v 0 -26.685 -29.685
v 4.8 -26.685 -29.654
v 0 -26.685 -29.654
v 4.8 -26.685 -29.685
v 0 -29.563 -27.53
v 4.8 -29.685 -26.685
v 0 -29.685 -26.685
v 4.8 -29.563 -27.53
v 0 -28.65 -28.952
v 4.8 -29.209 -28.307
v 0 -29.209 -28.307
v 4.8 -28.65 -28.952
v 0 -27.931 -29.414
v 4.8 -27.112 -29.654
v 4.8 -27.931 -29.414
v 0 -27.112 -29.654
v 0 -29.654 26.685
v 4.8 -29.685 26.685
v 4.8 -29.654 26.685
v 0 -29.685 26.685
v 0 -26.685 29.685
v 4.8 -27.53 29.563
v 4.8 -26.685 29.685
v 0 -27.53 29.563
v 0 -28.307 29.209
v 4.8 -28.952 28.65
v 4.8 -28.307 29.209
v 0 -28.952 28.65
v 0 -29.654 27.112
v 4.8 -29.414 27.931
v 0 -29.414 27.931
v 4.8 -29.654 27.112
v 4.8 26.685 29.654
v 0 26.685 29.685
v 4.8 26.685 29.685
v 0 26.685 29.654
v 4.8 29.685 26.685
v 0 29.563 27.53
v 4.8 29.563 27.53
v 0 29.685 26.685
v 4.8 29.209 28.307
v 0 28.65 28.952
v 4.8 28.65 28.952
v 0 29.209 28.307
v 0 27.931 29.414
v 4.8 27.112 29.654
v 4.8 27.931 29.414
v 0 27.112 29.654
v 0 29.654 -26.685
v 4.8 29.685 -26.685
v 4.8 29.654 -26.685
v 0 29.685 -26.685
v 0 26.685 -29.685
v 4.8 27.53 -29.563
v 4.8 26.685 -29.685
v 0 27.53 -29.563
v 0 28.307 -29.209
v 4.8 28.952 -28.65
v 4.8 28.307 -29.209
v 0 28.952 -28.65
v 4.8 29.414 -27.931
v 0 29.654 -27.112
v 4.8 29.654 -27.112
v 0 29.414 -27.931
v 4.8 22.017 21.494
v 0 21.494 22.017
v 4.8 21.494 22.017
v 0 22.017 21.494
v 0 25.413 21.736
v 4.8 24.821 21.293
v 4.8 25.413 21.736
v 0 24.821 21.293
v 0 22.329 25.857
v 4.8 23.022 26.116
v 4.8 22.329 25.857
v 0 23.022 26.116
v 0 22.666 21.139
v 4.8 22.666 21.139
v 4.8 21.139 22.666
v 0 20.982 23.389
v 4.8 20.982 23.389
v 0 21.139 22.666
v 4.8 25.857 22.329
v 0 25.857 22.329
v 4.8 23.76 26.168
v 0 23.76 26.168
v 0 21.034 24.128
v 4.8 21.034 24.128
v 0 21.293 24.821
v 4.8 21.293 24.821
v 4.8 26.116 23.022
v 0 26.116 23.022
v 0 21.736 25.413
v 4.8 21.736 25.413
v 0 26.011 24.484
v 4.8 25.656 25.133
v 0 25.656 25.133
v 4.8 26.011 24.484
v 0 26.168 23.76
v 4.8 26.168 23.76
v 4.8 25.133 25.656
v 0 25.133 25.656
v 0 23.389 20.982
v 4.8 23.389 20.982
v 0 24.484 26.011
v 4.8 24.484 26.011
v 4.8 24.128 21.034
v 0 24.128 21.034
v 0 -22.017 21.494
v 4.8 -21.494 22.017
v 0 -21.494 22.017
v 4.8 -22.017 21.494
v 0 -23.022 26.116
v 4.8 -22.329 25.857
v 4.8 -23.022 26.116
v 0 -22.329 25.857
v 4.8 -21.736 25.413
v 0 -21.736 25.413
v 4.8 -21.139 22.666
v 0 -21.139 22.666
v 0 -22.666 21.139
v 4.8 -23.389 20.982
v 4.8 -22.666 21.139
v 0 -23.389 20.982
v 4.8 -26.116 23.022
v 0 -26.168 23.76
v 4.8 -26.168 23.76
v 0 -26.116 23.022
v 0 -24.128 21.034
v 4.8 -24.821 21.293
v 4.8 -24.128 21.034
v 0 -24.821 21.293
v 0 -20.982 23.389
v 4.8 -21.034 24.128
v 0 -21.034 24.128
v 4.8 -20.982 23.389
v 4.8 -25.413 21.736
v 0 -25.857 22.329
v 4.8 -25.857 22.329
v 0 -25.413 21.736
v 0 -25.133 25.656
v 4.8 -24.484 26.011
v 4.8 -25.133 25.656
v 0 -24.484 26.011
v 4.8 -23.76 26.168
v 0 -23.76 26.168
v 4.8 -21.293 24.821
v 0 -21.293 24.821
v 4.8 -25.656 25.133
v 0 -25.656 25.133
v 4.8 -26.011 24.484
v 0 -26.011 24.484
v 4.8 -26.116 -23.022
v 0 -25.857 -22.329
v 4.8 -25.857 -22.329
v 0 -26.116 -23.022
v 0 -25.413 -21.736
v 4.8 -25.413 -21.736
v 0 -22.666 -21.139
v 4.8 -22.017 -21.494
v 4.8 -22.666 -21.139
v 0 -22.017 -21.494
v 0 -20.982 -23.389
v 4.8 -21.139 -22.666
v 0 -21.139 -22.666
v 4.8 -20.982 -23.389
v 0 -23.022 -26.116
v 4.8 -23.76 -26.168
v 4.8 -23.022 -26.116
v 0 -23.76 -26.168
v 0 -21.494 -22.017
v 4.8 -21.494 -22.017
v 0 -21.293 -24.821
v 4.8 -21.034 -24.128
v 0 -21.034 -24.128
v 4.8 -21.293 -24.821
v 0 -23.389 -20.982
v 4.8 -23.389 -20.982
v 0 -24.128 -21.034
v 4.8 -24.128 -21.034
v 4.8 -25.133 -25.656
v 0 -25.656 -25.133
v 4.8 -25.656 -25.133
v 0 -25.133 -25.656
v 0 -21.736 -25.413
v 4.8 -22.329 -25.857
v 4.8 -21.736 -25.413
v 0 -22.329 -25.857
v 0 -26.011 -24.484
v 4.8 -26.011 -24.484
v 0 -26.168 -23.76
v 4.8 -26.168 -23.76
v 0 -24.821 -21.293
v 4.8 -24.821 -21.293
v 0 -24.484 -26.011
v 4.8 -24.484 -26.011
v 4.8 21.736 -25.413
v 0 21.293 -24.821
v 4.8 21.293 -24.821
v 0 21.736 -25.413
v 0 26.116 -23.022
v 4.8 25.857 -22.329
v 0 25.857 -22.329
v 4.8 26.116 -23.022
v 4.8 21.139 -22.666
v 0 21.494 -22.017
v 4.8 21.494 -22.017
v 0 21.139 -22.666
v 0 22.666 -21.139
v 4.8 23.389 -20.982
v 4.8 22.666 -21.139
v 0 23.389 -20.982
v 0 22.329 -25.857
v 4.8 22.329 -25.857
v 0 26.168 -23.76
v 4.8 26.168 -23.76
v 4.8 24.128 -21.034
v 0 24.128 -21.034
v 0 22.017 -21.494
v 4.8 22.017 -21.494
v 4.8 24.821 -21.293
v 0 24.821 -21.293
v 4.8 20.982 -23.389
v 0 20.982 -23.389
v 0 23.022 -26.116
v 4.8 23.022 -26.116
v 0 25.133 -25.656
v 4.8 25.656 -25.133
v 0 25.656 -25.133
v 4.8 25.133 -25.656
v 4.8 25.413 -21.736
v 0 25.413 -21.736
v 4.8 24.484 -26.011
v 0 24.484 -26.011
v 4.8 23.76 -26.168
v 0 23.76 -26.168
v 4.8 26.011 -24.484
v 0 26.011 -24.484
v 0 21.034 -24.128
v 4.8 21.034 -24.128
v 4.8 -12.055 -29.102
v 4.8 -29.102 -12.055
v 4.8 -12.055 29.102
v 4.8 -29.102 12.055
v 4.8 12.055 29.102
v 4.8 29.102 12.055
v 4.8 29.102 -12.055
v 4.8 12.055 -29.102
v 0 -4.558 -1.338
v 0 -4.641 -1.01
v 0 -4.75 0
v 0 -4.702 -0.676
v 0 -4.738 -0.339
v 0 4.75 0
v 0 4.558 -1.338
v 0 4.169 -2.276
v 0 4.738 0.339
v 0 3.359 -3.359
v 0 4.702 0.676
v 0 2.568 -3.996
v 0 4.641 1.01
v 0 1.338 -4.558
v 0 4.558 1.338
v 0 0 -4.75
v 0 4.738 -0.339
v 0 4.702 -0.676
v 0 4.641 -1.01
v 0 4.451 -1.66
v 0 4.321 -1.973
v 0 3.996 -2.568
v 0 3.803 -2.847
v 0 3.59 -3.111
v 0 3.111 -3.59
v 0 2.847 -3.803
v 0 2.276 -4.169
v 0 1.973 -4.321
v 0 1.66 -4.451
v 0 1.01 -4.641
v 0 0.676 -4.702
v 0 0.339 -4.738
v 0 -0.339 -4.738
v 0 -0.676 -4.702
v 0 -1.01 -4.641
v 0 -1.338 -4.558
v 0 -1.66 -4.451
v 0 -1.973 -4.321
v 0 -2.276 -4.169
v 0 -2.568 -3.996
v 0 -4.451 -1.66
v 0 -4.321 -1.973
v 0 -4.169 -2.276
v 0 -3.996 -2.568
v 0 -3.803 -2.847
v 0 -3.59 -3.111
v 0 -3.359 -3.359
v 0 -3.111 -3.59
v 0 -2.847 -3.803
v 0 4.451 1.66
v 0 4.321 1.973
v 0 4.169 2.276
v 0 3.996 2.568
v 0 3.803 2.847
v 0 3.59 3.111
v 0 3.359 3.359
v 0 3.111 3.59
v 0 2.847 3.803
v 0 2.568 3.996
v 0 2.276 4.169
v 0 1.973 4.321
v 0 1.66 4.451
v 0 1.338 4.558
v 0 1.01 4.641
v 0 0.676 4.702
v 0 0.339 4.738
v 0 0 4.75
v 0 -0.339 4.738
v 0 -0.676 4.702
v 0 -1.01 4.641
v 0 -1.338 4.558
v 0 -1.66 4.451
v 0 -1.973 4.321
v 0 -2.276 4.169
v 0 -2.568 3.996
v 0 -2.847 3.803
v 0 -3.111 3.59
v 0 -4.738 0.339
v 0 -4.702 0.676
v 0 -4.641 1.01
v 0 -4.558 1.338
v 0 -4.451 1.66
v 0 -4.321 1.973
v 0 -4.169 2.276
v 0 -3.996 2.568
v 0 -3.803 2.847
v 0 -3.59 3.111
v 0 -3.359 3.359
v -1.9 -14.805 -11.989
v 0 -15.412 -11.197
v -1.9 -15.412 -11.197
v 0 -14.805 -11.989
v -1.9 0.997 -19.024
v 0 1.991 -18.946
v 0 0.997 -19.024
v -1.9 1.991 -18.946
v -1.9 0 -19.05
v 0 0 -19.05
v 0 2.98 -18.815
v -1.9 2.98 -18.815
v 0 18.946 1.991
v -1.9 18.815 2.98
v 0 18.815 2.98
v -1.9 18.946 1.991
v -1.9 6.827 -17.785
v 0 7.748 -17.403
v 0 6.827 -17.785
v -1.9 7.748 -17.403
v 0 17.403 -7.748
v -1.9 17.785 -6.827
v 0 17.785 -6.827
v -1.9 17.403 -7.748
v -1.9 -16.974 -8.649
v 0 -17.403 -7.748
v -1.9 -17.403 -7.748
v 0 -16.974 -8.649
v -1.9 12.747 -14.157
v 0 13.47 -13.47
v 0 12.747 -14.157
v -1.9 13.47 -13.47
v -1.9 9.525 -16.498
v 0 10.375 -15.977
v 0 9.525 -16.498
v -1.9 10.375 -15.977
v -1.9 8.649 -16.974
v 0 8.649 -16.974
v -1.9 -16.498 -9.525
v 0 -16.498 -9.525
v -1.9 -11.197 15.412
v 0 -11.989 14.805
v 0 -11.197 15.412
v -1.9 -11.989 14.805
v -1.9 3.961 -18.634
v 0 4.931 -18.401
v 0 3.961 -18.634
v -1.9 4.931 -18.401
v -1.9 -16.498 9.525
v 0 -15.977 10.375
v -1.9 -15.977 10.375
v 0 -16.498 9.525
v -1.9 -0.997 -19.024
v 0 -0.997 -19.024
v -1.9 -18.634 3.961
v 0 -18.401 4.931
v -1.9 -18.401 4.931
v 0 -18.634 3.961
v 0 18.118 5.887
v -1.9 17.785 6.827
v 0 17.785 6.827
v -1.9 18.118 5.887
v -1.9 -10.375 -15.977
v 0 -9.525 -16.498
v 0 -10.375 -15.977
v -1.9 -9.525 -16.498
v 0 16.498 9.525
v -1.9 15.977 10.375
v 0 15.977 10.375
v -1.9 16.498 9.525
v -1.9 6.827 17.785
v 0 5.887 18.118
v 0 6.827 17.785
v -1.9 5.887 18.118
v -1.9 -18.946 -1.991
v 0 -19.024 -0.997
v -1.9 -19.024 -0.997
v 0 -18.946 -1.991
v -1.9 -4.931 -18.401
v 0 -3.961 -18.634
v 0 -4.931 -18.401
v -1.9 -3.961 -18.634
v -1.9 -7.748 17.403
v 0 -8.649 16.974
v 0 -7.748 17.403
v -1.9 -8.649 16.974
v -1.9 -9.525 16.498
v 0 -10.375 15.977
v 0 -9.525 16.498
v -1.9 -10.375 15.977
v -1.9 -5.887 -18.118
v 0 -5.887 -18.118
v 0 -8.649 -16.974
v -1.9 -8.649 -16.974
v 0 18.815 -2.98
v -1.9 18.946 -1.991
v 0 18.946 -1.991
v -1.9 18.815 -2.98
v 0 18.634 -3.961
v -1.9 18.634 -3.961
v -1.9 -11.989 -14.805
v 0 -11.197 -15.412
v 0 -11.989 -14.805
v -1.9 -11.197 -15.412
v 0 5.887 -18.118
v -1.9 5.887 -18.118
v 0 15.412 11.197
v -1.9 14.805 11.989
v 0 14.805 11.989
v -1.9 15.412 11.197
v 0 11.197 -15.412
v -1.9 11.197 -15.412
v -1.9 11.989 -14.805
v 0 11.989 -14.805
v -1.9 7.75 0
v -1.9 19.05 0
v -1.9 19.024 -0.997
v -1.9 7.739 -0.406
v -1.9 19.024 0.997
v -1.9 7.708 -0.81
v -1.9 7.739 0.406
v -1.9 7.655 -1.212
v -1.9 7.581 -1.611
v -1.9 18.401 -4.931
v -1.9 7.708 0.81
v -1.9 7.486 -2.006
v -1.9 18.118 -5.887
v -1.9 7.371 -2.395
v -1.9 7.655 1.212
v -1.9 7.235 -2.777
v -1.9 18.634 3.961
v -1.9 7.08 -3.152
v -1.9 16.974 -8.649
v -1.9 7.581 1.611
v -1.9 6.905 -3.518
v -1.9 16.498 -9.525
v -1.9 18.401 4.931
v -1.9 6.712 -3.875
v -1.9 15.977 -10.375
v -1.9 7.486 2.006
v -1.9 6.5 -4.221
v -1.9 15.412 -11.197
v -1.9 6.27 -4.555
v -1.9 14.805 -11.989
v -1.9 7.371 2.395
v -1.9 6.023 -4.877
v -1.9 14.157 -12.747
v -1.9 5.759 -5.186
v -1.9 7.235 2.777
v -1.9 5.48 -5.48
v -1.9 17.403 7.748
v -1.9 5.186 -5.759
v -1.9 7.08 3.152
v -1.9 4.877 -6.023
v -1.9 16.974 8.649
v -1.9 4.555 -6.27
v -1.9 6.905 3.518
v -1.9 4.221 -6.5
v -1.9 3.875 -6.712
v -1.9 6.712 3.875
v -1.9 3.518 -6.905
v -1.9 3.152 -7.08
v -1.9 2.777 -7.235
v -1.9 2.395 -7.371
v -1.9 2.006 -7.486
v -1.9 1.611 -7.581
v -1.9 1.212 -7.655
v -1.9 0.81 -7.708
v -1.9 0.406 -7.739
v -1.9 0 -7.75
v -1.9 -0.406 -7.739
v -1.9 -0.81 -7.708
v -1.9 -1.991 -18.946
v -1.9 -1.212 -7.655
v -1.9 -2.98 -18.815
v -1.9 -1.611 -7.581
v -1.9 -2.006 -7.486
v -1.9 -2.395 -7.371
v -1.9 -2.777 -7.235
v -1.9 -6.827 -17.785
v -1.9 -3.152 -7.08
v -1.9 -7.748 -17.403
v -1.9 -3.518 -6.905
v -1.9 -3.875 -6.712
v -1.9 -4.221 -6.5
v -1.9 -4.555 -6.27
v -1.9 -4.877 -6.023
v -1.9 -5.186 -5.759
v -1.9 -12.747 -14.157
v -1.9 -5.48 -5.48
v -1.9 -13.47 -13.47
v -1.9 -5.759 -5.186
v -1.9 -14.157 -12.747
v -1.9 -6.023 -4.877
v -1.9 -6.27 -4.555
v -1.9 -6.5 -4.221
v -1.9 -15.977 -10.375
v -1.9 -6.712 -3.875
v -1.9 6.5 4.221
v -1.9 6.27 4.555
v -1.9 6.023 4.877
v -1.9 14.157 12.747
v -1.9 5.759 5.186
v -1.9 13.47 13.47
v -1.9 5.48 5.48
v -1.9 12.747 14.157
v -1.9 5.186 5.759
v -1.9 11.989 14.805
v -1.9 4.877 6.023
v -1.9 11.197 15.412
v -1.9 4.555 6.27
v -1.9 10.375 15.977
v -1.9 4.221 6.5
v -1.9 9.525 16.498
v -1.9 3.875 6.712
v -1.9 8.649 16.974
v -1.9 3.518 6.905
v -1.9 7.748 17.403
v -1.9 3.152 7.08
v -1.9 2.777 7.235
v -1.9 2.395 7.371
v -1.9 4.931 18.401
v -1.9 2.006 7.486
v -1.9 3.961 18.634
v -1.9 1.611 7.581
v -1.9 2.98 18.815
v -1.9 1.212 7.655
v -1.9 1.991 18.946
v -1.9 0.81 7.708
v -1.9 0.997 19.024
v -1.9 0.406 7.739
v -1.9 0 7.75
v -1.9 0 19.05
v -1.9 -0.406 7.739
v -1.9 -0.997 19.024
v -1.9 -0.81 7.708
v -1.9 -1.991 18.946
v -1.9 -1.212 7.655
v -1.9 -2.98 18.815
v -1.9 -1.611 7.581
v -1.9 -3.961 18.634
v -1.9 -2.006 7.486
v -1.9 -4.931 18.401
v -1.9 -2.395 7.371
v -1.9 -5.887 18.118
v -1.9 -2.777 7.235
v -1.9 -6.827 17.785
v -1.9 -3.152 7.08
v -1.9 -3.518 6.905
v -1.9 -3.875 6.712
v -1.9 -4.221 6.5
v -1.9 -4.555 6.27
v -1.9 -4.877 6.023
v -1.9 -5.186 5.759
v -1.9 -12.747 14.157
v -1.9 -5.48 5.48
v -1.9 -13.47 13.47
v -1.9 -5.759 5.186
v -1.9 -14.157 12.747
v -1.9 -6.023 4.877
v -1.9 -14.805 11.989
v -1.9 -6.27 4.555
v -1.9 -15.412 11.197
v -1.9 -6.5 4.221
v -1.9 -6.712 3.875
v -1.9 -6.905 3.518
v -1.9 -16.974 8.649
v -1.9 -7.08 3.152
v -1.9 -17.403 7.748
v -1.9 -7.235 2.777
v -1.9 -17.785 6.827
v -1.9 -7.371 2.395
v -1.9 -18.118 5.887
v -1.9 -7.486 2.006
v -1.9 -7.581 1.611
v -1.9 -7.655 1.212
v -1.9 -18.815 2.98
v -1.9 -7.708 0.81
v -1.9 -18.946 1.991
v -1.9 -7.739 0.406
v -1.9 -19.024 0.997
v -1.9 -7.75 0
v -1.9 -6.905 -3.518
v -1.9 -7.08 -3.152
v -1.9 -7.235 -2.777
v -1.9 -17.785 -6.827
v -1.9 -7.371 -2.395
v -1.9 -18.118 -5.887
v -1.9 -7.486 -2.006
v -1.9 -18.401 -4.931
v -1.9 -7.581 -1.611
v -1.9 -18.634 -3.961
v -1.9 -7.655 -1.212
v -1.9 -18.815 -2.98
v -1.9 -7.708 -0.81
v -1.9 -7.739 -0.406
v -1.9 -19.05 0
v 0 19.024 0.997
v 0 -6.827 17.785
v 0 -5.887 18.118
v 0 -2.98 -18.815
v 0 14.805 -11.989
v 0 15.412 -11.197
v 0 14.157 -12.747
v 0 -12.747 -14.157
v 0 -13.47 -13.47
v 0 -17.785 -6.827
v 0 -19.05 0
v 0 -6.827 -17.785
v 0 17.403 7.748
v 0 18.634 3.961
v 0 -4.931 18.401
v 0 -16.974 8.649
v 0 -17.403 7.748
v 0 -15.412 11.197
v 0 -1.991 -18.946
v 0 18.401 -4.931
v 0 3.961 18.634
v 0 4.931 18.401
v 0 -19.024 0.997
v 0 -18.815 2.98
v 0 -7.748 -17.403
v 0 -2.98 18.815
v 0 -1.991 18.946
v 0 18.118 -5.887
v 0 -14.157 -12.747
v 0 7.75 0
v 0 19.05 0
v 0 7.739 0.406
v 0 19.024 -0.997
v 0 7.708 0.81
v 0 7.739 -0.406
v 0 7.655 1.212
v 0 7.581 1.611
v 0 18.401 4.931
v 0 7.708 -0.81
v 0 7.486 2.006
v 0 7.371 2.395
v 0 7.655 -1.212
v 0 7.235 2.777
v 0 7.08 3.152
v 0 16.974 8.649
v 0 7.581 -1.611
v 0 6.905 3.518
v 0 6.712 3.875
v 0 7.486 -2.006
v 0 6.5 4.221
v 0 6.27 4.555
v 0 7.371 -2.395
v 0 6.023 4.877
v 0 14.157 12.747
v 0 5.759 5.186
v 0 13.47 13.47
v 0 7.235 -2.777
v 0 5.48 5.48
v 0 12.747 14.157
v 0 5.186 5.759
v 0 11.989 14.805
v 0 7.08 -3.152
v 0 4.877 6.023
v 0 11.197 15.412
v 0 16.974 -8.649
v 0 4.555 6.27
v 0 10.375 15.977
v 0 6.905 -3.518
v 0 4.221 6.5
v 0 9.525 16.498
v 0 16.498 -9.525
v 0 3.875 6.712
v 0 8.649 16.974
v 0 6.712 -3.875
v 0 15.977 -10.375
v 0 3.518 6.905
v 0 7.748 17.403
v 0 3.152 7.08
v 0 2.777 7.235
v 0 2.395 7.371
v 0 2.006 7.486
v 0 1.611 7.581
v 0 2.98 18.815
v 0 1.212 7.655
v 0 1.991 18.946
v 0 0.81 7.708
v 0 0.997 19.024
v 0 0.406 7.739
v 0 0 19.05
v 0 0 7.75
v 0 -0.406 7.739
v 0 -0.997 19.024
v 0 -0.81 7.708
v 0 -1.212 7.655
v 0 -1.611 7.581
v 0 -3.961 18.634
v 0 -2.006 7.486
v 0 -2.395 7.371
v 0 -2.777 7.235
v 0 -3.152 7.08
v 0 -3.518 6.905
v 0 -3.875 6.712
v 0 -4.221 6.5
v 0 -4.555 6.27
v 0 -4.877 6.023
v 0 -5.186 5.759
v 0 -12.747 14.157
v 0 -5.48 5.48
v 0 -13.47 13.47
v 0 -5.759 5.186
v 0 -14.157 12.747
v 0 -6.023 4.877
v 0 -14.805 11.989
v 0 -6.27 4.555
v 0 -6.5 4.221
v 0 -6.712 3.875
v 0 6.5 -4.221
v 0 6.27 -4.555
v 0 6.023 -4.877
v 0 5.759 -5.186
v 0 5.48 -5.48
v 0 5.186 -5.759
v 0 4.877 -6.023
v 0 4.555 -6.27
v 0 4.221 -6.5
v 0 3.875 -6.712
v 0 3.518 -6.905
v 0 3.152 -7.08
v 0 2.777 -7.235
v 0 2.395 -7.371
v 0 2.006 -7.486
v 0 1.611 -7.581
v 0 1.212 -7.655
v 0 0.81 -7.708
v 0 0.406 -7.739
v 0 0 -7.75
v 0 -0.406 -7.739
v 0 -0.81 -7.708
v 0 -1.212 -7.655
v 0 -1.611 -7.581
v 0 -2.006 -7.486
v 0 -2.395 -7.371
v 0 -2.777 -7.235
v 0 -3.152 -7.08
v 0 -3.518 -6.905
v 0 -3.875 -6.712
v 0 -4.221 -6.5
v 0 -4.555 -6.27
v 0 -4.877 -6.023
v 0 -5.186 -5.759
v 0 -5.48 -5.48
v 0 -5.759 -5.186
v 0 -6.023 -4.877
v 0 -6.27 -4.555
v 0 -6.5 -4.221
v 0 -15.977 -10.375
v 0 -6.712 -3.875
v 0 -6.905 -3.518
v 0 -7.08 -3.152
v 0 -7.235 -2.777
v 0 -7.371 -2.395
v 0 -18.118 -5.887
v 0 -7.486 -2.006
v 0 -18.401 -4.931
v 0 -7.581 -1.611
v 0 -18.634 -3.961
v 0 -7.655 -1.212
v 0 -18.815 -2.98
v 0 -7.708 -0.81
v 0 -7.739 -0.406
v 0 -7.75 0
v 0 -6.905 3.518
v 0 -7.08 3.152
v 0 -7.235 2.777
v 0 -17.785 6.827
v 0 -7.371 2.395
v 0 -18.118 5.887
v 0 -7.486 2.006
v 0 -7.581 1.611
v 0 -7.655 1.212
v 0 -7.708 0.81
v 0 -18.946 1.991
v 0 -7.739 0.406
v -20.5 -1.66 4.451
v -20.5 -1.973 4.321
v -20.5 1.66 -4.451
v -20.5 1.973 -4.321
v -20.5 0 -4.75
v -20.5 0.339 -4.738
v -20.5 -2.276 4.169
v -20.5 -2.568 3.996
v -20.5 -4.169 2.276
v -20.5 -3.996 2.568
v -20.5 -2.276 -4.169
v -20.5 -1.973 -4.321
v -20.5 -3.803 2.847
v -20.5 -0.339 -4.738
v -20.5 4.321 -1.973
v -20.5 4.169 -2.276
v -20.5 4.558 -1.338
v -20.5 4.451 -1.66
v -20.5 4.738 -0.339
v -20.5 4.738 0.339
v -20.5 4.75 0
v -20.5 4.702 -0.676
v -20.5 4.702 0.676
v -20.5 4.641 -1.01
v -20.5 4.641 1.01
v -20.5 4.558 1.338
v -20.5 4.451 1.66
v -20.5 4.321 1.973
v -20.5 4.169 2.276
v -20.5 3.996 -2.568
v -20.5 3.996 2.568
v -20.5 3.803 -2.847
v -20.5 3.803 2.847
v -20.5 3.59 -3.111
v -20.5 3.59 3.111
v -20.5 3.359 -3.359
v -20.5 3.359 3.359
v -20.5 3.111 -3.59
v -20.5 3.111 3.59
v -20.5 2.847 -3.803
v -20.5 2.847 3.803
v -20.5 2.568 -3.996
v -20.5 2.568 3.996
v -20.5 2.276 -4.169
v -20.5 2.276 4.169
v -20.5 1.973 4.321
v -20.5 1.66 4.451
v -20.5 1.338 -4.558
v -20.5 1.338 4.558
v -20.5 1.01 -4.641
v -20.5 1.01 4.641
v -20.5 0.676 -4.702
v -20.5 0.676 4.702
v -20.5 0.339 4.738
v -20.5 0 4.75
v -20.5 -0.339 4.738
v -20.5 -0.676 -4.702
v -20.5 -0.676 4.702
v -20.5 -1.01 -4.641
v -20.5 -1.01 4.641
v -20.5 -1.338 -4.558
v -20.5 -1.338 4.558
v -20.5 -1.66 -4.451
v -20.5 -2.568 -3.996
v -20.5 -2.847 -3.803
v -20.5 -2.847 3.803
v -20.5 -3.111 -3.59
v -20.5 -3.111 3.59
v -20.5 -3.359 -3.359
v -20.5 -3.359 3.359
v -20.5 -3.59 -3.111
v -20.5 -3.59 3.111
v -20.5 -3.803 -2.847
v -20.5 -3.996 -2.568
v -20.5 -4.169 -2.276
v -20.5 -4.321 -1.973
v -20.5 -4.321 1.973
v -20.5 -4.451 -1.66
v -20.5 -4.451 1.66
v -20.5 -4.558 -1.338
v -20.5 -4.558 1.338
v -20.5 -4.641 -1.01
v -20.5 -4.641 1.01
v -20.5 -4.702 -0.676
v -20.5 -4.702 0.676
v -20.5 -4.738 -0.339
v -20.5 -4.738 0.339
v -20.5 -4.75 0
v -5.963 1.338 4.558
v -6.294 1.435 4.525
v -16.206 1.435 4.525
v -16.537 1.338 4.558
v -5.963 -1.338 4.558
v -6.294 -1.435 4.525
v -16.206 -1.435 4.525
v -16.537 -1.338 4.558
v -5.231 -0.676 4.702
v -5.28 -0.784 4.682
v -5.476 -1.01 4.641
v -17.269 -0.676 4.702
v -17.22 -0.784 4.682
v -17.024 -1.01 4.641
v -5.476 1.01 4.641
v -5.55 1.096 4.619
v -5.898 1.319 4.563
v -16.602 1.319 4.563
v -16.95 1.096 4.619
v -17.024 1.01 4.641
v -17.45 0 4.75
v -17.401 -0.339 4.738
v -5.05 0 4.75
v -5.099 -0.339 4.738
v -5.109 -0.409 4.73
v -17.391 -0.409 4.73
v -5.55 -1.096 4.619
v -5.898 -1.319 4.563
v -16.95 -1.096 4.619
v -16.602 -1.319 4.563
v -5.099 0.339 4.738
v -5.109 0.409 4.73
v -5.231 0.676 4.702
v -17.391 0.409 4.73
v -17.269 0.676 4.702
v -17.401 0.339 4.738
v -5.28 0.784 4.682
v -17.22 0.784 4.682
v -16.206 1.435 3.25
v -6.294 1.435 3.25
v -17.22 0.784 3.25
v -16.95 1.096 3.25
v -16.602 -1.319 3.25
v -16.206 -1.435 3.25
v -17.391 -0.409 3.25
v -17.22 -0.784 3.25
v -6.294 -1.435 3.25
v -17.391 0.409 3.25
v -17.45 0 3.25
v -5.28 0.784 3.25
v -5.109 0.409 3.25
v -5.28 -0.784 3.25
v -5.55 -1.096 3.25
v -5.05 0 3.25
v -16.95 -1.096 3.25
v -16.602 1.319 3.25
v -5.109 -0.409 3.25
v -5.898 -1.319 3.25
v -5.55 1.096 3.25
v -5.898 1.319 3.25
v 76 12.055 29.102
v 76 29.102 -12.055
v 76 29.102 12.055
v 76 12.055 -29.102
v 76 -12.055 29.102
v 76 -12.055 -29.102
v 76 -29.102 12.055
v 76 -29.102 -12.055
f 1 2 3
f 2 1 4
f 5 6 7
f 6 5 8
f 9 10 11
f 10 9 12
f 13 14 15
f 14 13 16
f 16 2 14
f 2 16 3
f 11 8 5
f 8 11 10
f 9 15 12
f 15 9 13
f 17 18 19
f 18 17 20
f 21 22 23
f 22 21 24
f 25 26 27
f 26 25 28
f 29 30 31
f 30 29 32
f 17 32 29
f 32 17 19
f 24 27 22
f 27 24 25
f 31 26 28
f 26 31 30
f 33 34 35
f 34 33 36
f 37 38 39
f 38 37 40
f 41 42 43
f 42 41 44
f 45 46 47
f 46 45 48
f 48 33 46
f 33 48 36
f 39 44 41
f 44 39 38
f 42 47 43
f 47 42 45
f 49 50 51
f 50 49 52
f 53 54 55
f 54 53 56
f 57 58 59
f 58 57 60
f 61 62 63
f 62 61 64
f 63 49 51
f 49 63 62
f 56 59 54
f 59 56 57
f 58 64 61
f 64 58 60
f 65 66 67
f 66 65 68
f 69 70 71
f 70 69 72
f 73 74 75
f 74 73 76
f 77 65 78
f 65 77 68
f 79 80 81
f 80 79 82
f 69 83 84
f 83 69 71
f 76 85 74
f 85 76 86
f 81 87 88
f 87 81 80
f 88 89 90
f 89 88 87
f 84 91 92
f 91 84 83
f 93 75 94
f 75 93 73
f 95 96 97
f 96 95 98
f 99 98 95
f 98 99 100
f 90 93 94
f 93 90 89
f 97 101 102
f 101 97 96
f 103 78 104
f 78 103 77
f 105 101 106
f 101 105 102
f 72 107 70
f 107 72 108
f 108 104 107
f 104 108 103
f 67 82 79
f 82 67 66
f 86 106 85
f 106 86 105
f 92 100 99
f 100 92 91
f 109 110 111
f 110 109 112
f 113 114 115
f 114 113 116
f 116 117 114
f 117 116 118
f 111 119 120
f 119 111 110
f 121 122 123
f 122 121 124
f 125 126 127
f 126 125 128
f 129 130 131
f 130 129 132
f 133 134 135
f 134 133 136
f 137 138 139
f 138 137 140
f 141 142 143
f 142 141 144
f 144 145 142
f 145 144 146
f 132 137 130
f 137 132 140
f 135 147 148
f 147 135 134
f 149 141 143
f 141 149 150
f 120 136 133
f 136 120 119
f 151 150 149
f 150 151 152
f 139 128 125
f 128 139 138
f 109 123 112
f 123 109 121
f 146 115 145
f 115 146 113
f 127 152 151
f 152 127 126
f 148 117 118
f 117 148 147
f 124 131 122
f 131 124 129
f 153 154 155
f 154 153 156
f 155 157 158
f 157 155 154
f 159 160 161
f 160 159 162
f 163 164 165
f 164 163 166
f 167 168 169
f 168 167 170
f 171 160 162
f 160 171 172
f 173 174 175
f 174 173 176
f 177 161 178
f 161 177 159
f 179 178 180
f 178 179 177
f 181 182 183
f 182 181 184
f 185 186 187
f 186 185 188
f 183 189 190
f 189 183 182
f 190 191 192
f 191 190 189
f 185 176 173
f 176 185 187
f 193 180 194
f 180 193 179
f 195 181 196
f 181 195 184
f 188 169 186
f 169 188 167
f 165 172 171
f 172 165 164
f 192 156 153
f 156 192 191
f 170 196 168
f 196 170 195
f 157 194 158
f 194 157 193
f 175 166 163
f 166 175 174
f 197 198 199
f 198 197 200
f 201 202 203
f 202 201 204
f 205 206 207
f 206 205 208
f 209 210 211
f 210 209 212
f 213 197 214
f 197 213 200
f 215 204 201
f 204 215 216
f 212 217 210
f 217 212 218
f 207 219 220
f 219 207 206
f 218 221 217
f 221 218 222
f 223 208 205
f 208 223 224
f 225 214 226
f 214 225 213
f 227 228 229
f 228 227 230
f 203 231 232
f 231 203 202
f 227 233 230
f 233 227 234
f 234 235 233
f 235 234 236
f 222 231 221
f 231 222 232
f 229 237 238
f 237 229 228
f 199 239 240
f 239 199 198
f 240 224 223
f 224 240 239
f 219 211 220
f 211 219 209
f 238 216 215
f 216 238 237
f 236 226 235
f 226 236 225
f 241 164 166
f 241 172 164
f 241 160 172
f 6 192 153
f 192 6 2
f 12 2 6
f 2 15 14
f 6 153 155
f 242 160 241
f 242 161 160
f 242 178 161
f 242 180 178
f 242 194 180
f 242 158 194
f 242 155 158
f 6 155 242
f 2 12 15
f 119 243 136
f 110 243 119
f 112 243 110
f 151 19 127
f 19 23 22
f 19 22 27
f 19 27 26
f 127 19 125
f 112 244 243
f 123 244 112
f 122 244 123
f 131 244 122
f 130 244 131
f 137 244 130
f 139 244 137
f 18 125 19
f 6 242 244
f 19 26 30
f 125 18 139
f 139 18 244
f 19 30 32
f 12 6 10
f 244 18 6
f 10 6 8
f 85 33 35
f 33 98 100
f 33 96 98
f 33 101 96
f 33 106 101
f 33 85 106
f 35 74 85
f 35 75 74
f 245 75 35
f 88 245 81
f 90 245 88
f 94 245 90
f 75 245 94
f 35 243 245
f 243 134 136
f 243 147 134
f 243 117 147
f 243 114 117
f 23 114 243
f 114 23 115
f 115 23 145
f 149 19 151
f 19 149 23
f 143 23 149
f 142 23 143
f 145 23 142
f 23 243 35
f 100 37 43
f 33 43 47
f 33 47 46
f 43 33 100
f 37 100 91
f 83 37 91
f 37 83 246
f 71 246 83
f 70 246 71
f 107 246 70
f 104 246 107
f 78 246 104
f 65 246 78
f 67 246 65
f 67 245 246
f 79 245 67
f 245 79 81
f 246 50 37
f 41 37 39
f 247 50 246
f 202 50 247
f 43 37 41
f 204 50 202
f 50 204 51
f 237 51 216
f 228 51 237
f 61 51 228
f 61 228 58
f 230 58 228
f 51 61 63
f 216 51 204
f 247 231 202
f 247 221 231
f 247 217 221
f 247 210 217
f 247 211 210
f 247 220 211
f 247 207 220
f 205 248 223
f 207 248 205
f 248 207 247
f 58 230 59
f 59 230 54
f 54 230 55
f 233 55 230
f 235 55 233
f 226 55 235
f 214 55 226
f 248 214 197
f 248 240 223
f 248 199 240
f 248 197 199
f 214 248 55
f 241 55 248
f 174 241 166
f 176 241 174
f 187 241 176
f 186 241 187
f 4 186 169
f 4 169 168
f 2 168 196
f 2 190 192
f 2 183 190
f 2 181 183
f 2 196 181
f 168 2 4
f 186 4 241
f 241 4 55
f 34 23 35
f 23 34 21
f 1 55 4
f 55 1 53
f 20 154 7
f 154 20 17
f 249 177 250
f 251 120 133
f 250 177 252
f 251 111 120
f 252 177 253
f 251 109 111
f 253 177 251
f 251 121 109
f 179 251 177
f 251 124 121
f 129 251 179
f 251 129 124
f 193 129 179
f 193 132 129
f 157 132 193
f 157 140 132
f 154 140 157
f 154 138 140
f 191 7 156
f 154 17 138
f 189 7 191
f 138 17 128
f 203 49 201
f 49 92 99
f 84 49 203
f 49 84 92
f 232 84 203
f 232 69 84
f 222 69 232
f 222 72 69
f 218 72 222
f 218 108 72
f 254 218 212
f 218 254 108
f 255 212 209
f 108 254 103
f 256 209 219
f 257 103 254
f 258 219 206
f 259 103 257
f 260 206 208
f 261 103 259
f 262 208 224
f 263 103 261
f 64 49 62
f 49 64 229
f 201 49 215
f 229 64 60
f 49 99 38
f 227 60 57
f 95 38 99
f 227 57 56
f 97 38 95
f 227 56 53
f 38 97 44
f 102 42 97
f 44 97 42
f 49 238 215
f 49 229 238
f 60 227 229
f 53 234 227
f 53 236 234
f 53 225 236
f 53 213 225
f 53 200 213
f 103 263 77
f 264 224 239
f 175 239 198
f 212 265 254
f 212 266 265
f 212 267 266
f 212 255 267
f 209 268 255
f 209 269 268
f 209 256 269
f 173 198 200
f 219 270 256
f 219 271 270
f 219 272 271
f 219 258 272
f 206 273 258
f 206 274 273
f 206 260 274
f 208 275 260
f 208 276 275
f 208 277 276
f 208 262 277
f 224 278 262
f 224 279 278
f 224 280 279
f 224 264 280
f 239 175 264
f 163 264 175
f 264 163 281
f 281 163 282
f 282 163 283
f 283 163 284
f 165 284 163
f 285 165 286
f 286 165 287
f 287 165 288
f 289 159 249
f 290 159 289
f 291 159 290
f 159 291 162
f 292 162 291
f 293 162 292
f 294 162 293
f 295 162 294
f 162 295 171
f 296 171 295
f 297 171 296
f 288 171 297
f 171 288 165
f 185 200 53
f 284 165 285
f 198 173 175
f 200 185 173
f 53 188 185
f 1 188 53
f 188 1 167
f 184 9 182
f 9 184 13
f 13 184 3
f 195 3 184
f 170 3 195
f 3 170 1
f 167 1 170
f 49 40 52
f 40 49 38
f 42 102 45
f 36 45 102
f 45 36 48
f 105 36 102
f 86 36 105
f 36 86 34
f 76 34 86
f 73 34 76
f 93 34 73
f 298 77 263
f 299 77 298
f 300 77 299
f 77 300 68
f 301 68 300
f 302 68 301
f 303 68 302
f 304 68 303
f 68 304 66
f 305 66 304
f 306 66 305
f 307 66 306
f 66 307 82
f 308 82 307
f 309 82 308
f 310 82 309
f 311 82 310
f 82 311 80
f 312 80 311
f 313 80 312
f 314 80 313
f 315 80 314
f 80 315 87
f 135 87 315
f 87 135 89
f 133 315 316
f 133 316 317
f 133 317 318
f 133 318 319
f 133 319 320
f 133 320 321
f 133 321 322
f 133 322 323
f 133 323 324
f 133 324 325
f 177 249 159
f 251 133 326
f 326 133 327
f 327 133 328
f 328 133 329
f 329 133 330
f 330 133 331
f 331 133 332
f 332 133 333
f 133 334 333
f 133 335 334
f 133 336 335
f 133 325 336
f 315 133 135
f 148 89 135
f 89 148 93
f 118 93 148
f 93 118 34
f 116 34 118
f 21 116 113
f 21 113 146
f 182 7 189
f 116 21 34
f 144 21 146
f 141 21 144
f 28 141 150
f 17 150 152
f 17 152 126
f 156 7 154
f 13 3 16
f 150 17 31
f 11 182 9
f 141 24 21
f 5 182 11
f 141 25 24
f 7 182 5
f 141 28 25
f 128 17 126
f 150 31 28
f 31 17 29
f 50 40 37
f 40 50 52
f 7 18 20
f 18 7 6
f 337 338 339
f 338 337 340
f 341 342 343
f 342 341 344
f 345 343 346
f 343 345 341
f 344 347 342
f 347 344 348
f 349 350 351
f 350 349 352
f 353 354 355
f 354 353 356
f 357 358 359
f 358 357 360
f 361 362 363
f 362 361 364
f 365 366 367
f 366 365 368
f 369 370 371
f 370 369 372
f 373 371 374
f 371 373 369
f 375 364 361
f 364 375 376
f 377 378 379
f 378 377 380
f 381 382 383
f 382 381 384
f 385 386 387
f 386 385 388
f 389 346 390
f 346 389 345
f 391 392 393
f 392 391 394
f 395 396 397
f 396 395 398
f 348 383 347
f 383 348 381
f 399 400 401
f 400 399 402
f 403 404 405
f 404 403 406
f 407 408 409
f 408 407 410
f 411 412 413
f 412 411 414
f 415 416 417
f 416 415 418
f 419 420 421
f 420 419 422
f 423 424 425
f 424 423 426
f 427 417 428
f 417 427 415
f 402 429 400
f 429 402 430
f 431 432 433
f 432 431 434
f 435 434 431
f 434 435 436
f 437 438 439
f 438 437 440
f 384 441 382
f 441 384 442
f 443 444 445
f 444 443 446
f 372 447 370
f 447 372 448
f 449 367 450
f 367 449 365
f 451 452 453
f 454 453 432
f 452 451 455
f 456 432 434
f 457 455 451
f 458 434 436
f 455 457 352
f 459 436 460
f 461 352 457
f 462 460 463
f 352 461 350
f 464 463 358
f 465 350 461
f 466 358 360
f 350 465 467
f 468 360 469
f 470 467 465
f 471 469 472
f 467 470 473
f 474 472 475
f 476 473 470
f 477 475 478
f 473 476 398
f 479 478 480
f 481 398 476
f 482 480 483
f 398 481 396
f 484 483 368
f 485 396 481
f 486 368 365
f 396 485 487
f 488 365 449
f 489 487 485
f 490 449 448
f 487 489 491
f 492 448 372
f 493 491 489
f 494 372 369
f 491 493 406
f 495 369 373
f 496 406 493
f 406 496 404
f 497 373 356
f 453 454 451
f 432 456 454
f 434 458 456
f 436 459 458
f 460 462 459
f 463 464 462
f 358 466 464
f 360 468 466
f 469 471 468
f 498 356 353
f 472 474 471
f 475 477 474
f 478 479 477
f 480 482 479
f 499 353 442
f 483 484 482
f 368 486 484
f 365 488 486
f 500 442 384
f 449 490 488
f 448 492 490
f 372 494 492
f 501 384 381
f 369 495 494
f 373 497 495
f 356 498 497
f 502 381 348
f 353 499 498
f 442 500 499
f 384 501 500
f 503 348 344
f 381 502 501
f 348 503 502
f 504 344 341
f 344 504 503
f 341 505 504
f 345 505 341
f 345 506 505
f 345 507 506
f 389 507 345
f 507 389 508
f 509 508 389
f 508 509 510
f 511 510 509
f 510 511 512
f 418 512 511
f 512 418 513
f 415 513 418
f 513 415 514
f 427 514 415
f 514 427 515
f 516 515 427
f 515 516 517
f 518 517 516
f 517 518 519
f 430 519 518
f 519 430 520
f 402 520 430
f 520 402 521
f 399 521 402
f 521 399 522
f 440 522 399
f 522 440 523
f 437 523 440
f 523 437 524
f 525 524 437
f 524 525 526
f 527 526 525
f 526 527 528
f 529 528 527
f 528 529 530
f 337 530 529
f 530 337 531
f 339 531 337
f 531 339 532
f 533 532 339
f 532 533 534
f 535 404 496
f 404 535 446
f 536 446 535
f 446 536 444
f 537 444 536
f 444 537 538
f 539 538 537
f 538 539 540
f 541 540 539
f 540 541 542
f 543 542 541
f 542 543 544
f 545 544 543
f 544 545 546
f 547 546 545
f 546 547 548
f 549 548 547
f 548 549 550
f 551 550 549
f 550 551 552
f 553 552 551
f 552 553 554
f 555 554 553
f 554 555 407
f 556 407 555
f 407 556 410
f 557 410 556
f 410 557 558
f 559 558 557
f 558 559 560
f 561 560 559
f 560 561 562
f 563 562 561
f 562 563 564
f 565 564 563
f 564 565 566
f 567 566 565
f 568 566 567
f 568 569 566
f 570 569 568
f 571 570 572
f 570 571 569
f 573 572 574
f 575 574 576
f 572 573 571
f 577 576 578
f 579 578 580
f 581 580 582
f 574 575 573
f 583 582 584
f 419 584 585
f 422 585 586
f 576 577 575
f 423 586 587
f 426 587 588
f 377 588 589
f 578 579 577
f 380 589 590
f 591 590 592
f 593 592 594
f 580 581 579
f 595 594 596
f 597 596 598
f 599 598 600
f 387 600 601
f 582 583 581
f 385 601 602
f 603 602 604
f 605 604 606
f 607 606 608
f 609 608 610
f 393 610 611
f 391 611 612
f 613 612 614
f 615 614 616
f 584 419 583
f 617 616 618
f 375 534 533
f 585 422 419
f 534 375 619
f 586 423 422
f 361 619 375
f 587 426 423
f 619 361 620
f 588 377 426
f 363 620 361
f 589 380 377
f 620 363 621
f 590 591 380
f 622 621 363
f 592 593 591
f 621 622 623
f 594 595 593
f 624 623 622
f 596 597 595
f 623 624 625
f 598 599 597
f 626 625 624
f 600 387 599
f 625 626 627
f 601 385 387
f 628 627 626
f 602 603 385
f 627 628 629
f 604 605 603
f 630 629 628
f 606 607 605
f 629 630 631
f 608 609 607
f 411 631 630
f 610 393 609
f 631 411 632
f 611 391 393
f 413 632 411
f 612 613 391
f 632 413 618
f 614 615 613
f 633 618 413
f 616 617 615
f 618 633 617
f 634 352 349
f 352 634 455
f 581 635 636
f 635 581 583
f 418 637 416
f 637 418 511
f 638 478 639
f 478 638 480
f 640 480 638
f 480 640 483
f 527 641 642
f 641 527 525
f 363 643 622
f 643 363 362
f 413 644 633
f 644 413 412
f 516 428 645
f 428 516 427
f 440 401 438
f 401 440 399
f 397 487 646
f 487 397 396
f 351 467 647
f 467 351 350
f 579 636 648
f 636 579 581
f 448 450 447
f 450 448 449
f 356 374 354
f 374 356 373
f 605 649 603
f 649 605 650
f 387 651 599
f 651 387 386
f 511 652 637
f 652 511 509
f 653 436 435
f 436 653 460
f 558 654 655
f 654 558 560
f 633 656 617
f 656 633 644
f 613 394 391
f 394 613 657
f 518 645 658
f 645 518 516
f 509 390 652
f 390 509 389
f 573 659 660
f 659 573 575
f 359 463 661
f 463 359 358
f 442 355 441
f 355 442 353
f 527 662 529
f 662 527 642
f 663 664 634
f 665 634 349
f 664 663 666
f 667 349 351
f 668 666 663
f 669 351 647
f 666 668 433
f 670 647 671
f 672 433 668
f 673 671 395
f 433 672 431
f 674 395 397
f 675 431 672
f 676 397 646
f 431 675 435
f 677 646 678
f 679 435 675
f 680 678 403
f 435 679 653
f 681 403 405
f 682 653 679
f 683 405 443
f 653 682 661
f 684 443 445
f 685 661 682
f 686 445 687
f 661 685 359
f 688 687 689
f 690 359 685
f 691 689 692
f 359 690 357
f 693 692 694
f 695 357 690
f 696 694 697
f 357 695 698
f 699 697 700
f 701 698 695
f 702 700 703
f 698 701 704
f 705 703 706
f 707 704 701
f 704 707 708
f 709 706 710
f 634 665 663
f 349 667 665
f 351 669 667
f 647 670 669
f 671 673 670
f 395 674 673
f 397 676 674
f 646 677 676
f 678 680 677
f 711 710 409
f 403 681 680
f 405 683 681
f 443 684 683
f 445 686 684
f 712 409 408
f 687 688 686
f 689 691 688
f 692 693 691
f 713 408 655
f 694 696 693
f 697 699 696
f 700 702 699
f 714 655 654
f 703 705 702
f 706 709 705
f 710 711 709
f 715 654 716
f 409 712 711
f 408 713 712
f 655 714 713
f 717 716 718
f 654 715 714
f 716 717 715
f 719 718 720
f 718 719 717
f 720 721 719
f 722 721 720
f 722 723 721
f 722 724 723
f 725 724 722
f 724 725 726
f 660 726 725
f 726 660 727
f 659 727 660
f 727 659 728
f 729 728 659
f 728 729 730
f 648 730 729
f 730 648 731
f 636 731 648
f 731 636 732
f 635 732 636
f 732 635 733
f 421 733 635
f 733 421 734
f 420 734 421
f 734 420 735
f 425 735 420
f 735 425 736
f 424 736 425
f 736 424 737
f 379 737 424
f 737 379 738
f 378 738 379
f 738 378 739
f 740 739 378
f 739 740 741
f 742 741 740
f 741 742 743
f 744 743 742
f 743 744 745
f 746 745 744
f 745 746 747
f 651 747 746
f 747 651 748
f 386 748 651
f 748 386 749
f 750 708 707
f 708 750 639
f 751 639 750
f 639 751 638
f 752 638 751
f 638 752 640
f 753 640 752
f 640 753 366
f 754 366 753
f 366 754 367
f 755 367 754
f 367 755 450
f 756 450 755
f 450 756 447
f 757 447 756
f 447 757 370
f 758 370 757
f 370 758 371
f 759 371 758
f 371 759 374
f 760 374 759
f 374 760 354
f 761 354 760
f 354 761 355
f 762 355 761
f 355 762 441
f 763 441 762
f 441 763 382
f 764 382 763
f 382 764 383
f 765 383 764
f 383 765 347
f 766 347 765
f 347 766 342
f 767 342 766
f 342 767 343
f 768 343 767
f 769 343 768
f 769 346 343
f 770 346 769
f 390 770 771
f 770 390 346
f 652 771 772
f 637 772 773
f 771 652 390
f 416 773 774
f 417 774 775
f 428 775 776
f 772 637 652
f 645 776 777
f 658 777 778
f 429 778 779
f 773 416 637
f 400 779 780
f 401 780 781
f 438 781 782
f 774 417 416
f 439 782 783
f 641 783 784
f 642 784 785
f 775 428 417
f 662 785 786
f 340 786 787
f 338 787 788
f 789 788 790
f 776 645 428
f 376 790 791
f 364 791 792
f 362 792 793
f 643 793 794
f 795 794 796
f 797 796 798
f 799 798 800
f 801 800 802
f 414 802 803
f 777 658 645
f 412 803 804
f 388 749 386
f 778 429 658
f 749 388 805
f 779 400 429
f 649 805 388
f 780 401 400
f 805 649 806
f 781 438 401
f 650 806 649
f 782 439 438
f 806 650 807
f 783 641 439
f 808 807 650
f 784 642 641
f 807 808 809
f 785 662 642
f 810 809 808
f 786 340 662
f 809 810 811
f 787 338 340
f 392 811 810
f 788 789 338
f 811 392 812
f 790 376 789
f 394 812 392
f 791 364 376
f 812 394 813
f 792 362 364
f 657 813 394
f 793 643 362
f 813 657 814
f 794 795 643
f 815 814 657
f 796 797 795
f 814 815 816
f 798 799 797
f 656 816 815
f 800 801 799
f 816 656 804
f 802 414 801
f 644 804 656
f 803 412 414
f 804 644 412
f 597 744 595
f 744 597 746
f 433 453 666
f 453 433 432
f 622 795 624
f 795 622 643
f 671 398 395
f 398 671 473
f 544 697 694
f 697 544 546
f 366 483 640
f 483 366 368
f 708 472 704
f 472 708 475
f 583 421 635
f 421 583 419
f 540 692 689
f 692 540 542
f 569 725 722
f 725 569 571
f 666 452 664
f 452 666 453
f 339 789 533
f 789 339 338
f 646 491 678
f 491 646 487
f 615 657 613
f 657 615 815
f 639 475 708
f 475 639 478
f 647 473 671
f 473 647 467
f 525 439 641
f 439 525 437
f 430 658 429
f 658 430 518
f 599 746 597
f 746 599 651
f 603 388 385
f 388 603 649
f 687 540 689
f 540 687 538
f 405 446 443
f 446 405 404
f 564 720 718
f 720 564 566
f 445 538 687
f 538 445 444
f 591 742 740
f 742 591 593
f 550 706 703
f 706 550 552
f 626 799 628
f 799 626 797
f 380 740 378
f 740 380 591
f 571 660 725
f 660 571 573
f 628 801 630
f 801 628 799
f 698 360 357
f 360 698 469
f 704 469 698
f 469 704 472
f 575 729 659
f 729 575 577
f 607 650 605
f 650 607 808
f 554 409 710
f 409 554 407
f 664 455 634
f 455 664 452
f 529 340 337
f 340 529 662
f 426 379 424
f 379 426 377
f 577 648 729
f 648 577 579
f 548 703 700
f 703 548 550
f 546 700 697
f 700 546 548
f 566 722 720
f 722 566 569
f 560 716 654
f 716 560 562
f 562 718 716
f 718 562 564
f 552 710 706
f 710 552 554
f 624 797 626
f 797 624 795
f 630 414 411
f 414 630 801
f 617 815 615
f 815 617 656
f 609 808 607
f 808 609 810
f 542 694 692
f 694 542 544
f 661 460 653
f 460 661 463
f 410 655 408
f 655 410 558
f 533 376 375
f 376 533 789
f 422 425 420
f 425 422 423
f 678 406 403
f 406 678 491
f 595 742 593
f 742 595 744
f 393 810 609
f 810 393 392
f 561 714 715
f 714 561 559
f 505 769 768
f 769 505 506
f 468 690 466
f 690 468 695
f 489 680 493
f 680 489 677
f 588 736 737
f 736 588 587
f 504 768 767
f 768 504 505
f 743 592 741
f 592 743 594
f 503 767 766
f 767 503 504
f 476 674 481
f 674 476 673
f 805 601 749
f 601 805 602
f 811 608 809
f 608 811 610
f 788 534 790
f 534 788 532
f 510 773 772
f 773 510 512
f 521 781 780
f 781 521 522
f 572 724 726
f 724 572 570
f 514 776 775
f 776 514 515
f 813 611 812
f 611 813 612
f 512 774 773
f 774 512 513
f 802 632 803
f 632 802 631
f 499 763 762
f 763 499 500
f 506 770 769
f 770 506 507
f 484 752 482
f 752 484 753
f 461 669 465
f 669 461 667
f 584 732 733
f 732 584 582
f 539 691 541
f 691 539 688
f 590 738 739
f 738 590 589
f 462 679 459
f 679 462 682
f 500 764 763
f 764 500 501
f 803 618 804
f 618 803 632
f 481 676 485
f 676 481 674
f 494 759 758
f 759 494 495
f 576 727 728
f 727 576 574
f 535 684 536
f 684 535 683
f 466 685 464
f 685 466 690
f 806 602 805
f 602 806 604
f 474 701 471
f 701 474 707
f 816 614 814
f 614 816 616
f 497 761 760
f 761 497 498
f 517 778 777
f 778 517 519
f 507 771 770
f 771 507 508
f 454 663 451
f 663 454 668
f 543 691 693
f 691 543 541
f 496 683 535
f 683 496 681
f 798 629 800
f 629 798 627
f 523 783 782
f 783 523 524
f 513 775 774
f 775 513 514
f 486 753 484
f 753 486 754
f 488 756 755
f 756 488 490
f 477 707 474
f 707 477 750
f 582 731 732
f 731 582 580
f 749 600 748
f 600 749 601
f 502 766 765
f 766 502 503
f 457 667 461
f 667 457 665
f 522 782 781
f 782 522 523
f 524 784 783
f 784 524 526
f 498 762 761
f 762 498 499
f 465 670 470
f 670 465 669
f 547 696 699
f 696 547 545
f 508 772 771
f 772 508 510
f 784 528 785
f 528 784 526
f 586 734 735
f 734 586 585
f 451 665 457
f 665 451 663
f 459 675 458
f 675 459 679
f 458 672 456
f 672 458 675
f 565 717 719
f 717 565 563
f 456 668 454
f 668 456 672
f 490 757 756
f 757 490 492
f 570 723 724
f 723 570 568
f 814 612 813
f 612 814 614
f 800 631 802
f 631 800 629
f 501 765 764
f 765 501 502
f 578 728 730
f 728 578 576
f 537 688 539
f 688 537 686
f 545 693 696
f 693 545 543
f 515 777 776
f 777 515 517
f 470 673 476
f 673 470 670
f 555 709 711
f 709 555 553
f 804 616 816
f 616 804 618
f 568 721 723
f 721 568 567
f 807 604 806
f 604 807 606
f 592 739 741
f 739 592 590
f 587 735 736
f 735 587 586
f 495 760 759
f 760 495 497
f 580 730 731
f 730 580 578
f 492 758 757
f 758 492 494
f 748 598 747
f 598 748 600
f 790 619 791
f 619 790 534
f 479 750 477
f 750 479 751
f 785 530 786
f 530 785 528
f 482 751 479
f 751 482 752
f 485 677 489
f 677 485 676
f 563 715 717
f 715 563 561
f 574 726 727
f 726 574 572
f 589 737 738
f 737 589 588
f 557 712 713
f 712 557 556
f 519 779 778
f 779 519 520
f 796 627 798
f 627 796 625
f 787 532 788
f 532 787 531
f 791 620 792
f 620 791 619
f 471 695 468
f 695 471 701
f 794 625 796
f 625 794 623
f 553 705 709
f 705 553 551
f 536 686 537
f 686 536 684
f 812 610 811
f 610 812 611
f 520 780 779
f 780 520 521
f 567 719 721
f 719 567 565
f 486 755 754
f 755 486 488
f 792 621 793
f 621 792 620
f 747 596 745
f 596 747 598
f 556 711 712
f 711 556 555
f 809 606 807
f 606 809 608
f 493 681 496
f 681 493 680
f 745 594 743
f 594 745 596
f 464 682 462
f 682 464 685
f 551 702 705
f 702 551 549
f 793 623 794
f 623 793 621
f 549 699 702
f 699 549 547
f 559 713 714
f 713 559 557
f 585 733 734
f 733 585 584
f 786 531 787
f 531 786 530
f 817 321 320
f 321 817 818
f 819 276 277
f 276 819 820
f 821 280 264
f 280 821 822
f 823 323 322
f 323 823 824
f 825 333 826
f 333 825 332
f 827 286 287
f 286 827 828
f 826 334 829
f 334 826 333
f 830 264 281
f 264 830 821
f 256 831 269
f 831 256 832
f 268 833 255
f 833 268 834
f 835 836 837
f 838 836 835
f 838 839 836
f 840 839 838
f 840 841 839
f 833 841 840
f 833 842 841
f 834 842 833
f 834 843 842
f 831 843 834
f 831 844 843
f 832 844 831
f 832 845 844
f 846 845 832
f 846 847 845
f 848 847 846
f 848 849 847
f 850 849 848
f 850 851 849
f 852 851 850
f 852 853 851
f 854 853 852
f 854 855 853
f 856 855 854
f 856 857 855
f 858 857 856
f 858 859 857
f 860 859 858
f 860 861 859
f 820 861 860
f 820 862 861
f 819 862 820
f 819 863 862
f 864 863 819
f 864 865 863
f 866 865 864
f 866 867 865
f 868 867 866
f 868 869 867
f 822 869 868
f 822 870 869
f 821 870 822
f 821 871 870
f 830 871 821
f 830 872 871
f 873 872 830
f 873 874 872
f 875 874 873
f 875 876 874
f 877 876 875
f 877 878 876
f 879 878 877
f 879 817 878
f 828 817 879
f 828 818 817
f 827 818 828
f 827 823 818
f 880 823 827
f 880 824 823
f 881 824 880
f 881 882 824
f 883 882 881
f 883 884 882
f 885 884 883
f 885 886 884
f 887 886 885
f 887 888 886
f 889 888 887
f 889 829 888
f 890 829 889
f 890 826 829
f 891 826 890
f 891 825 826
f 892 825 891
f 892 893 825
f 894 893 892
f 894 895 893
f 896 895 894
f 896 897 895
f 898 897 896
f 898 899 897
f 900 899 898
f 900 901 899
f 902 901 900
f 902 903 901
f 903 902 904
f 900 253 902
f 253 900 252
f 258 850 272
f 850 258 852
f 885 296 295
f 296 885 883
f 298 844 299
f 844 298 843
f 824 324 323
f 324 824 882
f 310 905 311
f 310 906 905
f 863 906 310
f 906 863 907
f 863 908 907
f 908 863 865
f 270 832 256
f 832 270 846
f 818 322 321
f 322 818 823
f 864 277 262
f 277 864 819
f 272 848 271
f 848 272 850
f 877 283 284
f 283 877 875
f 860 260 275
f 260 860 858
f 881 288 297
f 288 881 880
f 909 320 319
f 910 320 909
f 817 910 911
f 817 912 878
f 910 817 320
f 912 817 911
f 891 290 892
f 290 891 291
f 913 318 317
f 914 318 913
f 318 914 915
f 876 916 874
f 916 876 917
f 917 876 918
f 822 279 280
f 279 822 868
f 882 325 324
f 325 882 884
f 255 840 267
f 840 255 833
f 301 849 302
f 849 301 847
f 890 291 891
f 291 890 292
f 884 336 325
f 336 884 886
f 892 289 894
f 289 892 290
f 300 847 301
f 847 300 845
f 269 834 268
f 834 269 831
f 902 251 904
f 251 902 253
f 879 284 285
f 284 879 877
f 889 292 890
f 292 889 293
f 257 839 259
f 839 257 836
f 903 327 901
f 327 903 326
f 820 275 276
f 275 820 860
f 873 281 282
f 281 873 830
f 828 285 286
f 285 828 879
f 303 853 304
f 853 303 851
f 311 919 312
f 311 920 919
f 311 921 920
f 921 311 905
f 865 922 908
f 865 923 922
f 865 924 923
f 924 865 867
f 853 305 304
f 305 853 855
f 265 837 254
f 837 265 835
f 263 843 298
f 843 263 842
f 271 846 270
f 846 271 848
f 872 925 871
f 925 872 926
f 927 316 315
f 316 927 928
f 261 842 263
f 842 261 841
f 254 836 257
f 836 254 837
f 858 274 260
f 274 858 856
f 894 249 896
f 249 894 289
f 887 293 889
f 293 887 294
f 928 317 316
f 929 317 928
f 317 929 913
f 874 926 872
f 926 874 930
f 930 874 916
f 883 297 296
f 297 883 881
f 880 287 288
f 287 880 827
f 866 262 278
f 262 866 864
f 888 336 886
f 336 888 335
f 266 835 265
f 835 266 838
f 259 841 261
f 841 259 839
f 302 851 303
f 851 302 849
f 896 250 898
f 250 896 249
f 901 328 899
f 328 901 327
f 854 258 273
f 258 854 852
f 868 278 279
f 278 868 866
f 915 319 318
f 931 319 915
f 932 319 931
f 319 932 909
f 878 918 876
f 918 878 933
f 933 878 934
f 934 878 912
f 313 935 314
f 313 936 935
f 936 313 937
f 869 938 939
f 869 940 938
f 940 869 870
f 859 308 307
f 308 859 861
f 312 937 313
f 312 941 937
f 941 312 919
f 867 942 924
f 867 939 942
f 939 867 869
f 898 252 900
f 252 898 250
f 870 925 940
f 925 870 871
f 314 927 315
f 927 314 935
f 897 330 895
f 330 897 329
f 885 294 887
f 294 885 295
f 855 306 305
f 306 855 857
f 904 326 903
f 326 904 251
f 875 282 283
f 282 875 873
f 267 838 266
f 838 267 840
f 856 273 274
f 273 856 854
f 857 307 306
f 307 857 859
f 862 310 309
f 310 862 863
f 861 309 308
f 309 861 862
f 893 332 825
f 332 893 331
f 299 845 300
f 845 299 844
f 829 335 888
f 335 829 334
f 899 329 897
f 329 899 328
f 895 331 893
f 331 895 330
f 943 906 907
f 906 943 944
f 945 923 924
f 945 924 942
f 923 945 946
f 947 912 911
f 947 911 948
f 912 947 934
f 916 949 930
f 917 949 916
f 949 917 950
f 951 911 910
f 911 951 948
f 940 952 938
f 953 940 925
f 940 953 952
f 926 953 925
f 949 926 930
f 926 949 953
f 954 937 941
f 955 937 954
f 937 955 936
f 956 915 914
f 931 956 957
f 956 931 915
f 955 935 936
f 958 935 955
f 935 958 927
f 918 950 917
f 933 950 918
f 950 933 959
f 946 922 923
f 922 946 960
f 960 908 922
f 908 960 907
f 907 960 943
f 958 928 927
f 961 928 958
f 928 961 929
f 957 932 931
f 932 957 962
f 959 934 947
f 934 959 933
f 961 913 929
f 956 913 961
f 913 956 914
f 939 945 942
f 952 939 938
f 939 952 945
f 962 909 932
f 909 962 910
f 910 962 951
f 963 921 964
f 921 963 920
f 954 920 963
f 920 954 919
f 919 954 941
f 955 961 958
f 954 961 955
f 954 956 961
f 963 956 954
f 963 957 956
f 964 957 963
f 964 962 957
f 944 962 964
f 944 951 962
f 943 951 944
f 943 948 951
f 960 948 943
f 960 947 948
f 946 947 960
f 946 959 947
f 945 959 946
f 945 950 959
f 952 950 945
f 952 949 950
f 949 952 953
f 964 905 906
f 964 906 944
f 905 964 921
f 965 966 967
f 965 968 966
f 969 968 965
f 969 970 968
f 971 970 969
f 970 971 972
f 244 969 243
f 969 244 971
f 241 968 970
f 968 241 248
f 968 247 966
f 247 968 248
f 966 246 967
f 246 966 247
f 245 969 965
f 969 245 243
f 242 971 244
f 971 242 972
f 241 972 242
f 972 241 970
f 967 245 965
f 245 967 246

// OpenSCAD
// file: ../Parts/rounder.scad
// rounder.scad
// cutting tool for rounding off corners with a cylinder

//---------------------
module rounder(
r=10,   // radius
h=10,   // height
f=22,    // $fn
extra=0.01  // extra size for the cube
){

difference(){
  translate([-extra,-extra,-extra])
  cube([r+extra,r+extra,h+2*extra]);
  translate([r,r,-1])
  cylinder(r=r,h=h+2,$fn=f);
}

}

//========================

rounder();

//========================
// main file
//=================================================================================
// Tek2310.scad
// Model for Teknic Motor PN M-2310P-LN-04K with encoder mounted
// precision tech pn 755-0021425
// This is the motor TI includes in the B2B test rig
//
// Dr Tom Flint, 16 Nov 2020
//=================================================================================

use <../Parts/rounder.scad>

module tek2310(
tol=0
){

// mounting flange
r0=3;
x1=59.37;
x2=x1/2;
difference(){
  translate([2.4,0,0])
  cube([4.8,x1,x1],center=true);

  // round off corners
  translate([-1,-x2,-x2])
  rotate([0,90,0])
  rotate([0,0,90])
  rounder(r=r0,h=6,f=22);

  translate([-1,-x2,x2])
  rotate([0,90,0])
  rotate([0,0,0])
  rounder(r=r0,h=6,f=22);

  translate([-1,x2,x2])
  rotate([0,90,0])
  rotate([0,0,-90])
  rounder(r=r0,h=6,f=22);

  translate([-1,x2,-x2])
  rotate([0,90,0])
  rotate([0,0,180])
  rounder(r=r0,h=6,f=22);
  
  // cut bolt holes
  for(i=[0:3]){
    rotate([45+90*i,0,0])
    translate([-1,33.34,0])
    rotate([0,90,0])
    cylinder(r=5.2/2,h=7,$fn=22);
  }
}

// motor body
translate([4.8,0,0])
rotate([0,90,0])
rotate([0,0,22.5])
cylinder(r=31.5,h=71.2,$fn=8);

// circular lip
translate([-1.9,0,0])
rotate([0,90,0])
difference(){
  cylinder(r=38.1/2,h=1.9,$fn=120);
  cylinder(r=15.5/2,h=5,center=true,$fn=120);
}


difference(){
  // shaft
  translate([-1.9-18.6,0,0])
  rotate([0,90,0])
  cylinder(r=9.5/2,h=1.9+18.6,$fn=88);

  // keyway
  translate([-16,0,9.5/2-1.5])
  hull(){
    cylinder(r=2.9/2,h=2,$fn=22);
    translate([9.5,0,0])
    cylinder(r=2.9/2,h=2,$fn=22);
  }
}

}
//===================================================

tek2310();

//====================================================
